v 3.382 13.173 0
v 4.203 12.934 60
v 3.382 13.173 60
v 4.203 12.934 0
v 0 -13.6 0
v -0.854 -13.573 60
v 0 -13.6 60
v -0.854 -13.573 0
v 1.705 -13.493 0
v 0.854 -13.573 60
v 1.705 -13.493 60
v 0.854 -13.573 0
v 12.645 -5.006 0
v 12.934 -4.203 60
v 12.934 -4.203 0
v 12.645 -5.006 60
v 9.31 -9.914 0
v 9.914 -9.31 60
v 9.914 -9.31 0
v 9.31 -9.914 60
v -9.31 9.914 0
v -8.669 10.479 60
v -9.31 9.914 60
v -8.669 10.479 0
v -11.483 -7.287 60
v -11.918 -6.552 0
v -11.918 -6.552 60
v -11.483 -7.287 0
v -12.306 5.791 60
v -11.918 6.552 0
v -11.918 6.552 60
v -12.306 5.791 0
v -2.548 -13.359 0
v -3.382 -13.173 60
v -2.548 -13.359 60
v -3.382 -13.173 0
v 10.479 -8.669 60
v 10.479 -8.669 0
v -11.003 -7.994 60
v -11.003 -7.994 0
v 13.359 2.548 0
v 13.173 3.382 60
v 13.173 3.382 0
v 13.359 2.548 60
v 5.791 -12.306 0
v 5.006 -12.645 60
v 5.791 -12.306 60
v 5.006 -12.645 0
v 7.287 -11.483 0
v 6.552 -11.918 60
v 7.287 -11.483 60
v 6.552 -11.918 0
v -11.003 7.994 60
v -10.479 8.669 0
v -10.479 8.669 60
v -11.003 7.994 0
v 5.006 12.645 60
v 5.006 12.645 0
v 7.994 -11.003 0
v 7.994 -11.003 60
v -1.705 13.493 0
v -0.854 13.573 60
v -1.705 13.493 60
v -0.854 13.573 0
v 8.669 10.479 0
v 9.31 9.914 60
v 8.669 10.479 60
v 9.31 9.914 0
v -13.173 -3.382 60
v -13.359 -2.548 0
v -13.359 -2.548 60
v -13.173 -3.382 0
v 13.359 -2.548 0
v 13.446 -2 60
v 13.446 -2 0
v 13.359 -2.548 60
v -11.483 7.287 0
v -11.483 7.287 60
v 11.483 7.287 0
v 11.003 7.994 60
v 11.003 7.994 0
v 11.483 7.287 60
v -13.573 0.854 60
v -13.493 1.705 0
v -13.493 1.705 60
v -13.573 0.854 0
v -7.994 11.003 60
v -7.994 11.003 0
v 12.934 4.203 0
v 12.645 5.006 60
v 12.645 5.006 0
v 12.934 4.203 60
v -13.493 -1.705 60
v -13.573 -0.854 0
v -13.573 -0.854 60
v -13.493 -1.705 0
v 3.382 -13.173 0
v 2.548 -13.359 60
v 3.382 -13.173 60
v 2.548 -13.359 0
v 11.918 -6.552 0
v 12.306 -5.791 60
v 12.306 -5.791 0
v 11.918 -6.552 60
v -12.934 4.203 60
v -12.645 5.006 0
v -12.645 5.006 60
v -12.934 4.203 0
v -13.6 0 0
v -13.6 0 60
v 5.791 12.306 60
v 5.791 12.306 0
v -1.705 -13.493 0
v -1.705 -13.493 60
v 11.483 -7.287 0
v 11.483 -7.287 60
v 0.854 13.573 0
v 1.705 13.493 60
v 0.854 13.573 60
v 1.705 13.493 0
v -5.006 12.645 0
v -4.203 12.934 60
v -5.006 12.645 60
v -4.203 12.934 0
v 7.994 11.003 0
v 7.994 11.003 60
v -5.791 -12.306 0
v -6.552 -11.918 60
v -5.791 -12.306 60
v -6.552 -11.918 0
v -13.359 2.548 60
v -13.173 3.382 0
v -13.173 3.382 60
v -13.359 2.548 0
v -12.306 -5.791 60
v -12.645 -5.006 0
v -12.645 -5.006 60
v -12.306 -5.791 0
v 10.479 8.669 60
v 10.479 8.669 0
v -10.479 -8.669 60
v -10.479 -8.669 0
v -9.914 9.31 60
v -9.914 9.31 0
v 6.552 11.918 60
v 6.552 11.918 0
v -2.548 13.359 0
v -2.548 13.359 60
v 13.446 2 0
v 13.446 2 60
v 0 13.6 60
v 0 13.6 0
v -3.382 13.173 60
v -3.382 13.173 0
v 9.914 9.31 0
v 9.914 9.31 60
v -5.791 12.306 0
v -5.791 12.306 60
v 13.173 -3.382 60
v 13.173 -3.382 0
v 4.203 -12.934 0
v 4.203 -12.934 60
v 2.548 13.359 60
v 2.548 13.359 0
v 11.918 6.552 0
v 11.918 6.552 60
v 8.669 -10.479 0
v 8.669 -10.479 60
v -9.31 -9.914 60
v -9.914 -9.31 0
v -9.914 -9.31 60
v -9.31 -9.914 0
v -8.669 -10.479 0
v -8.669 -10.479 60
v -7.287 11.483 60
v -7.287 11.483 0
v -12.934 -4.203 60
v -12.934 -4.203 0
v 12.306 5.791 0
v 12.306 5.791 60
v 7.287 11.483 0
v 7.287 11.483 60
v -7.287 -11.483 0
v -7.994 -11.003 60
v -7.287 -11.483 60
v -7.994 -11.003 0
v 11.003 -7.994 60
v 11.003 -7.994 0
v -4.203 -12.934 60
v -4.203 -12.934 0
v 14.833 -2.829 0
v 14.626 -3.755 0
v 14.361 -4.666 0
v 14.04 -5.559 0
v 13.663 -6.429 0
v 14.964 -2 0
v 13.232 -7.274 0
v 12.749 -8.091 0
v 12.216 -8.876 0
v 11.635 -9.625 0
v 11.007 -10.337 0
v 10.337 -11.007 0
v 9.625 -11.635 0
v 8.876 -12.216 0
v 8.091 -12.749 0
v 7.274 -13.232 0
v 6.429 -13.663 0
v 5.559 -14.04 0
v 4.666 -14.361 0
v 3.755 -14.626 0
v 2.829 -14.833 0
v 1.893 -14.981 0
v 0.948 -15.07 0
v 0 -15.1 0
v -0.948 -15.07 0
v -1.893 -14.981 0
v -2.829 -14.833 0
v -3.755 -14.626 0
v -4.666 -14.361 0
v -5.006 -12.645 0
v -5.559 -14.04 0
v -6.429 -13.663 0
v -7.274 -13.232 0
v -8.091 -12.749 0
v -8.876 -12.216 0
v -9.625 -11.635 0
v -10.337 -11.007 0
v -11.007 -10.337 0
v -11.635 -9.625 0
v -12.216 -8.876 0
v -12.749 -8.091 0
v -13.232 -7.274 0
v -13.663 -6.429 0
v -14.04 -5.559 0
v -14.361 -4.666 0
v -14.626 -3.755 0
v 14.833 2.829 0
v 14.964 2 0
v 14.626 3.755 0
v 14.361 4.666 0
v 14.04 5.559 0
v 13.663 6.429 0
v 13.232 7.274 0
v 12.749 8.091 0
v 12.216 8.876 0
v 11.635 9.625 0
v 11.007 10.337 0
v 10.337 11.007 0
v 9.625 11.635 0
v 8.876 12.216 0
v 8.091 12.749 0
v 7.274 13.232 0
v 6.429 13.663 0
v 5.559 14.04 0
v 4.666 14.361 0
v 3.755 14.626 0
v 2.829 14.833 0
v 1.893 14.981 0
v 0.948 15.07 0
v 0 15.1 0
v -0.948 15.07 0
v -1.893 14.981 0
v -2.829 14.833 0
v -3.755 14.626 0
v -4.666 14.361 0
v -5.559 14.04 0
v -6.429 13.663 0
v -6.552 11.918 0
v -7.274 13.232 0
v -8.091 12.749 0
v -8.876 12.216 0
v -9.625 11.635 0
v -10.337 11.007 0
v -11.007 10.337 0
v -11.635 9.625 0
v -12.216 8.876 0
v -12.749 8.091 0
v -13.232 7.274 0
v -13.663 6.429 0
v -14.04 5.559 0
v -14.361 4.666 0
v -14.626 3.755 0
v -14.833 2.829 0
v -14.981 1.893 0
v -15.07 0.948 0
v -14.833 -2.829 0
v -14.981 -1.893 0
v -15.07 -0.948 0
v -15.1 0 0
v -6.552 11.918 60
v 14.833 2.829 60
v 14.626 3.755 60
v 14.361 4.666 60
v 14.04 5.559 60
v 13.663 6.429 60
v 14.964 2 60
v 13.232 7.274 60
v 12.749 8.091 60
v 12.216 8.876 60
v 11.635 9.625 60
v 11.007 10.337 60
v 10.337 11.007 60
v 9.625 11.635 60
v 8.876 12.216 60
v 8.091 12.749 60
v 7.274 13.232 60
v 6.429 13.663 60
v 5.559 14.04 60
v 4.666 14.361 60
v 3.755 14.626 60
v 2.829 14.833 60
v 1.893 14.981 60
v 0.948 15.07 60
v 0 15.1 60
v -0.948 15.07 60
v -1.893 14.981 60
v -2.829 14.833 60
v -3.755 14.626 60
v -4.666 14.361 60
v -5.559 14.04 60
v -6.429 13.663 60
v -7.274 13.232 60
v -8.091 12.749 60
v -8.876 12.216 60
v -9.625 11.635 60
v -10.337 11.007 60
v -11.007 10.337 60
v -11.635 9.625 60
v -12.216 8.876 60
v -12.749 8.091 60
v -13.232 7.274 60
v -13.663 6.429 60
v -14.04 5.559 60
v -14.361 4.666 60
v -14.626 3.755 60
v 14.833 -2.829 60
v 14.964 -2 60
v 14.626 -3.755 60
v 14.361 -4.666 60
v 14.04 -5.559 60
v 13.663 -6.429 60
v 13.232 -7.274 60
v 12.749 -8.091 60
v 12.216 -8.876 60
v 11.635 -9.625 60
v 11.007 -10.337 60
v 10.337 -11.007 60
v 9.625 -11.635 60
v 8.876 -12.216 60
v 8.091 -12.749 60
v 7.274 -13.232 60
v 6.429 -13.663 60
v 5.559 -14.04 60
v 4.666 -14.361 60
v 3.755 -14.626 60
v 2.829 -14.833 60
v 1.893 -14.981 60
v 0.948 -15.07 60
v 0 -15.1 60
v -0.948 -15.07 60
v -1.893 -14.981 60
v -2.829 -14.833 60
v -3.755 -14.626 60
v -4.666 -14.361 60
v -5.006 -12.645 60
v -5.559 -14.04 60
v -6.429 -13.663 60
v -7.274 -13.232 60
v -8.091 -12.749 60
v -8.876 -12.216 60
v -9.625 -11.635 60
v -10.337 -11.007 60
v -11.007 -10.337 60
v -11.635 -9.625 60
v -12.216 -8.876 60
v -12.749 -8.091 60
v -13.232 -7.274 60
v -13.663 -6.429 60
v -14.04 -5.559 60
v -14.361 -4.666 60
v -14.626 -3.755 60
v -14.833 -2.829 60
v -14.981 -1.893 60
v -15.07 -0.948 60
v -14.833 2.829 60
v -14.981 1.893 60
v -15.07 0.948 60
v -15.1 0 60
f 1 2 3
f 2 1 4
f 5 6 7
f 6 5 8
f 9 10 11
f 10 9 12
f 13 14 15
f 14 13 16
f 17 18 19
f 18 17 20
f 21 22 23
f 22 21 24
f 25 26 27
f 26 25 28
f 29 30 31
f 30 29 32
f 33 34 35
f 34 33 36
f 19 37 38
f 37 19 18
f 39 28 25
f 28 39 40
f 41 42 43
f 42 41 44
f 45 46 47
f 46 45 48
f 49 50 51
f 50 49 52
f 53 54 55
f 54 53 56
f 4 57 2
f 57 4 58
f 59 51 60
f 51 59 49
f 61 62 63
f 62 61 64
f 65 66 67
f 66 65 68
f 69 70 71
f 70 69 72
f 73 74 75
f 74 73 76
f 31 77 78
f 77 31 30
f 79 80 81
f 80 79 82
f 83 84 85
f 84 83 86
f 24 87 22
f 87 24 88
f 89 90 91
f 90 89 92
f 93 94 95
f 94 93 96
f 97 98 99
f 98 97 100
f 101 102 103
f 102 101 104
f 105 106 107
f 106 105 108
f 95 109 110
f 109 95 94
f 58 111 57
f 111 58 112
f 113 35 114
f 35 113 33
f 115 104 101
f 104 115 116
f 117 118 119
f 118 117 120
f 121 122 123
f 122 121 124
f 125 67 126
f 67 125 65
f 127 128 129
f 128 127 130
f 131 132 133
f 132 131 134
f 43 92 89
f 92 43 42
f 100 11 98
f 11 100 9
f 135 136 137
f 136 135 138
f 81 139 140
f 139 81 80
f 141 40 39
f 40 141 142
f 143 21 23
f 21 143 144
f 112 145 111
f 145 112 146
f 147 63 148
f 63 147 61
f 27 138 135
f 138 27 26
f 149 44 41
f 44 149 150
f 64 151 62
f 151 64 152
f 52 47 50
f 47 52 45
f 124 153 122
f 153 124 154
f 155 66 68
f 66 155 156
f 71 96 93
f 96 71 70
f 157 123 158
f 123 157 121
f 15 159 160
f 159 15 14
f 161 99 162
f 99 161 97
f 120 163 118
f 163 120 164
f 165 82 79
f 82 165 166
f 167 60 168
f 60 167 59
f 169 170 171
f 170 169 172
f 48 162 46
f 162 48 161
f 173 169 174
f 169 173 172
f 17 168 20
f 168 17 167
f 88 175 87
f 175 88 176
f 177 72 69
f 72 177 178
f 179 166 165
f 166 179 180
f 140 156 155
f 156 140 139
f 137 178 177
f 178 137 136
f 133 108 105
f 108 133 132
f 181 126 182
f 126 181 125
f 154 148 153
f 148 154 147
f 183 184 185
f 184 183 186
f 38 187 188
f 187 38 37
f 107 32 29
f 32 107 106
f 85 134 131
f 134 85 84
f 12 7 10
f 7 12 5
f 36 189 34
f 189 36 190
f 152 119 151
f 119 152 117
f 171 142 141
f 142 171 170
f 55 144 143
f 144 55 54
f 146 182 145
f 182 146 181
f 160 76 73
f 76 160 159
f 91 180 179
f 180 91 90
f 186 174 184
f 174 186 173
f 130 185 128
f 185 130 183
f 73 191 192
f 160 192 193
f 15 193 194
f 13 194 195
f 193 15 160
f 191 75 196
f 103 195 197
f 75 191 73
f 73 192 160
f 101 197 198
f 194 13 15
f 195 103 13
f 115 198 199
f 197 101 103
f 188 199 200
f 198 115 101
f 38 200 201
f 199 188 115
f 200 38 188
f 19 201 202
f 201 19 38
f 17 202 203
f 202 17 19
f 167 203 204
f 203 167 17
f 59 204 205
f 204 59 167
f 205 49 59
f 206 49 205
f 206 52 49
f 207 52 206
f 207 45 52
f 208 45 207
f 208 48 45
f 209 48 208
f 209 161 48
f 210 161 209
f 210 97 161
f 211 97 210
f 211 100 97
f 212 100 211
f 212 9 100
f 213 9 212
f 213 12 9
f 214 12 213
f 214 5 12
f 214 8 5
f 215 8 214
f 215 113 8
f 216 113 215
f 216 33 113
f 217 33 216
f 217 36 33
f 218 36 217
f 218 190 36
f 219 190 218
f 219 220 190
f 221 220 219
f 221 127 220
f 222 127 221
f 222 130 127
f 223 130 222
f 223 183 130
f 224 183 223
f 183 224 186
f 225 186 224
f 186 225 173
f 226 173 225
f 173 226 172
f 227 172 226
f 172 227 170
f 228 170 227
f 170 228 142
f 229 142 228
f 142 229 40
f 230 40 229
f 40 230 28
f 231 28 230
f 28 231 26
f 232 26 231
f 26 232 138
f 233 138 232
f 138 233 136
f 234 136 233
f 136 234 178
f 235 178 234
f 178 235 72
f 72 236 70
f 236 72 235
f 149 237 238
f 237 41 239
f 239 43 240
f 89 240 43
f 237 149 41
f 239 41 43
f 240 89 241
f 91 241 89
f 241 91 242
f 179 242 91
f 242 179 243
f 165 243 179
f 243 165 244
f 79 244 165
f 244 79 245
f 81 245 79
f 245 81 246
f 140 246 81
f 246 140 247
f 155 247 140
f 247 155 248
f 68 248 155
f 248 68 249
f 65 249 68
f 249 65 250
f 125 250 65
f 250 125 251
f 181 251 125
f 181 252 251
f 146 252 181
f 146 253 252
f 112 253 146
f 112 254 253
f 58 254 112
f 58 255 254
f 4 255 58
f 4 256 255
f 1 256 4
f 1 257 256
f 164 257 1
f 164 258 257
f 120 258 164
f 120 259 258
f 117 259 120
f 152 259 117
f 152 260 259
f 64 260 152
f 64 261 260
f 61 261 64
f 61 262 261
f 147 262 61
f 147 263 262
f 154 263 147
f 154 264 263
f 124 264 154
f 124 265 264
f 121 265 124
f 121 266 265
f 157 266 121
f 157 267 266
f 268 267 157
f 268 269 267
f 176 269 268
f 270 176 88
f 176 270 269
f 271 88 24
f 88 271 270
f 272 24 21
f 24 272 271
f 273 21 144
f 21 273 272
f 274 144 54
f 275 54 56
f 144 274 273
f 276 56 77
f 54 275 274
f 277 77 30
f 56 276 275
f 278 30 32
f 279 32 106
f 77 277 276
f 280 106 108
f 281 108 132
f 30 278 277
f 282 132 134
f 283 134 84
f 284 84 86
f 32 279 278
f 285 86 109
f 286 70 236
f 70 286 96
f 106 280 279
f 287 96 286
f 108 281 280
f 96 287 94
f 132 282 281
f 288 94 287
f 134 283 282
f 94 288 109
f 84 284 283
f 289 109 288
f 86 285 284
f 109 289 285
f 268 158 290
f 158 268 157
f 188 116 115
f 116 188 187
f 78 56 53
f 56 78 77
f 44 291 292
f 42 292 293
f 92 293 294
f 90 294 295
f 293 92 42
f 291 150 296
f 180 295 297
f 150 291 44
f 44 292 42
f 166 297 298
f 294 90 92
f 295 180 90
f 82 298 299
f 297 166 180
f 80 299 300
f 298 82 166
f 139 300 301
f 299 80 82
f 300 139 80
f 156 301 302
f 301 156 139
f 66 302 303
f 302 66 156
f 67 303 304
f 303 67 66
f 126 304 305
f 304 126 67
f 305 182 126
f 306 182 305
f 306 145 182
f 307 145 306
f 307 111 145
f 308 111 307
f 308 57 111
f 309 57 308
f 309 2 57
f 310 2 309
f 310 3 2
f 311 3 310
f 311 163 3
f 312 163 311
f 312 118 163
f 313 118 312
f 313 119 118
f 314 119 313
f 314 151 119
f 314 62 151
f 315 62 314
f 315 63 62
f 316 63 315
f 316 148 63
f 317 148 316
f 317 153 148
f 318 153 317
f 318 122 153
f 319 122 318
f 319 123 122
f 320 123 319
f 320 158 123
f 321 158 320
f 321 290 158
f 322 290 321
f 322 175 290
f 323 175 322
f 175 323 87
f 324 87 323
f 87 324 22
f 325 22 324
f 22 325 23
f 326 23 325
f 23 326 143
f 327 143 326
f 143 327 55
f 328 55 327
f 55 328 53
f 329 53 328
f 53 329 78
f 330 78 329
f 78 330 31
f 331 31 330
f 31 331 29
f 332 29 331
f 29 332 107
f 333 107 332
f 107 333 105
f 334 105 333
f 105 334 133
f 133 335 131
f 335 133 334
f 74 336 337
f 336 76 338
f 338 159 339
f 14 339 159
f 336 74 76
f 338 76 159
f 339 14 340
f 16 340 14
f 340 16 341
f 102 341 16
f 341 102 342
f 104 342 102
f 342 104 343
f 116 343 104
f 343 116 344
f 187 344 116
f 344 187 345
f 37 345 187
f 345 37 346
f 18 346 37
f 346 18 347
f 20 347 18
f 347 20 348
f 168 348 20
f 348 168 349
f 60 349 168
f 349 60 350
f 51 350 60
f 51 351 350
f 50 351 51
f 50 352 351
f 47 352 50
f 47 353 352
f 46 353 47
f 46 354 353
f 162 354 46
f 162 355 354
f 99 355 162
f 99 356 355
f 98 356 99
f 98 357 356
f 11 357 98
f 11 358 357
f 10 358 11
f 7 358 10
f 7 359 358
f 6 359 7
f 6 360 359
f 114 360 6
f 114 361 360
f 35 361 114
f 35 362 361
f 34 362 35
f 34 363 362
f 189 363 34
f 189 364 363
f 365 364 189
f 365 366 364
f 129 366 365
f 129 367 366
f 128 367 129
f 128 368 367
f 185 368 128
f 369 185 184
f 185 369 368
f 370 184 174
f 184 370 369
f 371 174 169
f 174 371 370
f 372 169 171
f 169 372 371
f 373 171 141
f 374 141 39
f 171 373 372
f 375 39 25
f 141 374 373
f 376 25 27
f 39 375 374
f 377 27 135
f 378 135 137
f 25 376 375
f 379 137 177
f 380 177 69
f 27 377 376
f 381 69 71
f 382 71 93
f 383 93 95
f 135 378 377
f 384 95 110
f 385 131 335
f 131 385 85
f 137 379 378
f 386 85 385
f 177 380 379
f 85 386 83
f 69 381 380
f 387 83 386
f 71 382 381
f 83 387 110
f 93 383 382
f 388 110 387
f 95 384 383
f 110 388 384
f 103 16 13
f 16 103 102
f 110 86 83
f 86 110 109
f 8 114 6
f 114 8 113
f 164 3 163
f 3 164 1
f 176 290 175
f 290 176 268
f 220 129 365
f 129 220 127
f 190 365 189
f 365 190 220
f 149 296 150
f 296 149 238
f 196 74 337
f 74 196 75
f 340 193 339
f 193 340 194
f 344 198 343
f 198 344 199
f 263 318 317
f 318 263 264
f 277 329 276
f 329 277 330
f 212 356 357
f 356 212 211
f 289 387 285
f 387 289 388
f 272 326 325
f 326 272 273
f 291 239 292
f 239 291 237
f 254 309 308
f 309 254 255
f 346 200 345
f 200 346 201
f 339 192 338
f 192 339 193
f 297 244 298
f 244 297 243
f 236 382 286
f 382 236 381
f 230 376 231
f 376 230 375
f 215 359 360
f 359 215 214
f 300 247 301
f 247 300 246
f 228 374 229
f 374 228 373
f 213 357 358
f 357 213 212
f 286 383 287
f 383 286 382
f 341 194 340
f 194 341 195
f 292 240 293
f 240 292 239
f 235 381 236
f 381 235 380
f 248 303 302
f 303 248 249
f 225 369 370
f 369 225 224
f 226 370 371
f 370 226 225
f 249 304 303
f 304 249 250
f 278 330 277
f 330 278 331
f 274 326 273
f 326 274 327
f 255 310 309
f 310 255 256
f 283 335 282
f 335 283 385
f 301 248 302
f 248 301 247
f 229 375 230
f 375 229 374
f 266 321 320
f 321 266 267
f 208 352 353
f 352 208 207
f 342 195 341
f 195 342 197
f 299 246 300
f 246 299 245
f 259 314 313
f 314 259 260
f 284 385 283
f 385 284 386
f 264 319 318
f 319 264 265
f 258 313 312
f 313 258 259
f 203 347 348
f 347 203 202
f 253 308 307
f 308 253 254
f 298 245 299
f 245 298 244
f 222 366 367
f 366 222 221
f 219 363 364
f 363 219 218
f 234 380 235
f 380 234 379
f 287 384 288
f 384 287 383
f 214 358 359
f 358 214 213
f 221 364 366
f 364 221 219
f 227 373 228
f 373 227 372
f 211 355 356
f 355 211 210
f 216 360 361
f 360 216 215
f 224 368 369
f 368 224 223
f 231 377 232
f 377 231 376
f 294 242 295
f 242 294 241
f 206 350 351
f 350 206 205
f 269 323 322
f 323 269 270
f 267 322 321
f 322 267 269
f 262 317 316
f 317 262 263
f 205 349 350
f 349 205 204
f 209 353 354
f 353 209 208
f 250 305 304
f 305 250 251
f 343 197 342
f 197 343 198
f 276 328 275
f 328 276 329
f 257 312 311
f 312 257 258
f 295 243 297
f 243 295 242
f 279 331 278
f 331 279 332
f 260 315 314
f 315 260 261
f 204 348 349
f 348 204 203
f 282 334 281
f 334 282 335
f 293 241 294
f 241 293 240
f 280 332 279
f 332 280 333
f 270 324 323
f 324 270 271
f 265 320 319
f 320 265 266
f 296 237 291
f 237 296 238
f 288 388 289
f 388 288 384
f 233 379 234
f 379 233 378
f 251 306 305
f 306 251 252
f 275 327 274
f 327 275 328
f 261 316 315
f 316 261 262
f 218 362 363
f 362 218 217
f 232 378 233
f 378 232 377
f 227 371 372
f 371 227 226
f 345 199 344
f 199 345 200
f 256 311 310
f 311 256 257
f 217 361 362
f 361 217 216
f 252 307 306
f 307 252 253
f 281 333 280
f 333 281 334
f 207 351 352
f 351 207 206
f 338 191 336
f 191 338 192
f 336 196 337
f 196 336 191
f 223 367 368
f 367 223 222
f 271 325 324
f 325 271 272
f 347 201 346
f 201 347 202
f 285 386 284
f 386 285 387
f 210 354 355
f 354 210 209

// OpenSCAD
// 298 / 2 = 149
// 286 / 2 = 143
// 272 / 2 = 136
$fn = 100;


// 14.9 - 13.6 = 1.3  

h = 60; // mm
d = 27.2;
do = 30.2;

d1 = d + 0.00 * d;
d2 = do + 0.00 * do;
echo(d1);
echo(d2);
difference(){
    
        cylinder(d=d2, h= h); 
        
        union() {
            cylinder(d=d1, h= h); 
            translate([d2-d1,0,h/2]) cube(size=[d2,4,h], center=true);
        }
        
    
//    // inner tube + cutout
//    union(){ 
//        cylinder(r=13.6 + 0.1, h= 80.1, center=true); // pad for smoothness
//        translate([12,0,0]){
//            // gap can be bigger, ex. 4
//            cube(size=[15,3,81], center=true);
//        }   
//    }
}
